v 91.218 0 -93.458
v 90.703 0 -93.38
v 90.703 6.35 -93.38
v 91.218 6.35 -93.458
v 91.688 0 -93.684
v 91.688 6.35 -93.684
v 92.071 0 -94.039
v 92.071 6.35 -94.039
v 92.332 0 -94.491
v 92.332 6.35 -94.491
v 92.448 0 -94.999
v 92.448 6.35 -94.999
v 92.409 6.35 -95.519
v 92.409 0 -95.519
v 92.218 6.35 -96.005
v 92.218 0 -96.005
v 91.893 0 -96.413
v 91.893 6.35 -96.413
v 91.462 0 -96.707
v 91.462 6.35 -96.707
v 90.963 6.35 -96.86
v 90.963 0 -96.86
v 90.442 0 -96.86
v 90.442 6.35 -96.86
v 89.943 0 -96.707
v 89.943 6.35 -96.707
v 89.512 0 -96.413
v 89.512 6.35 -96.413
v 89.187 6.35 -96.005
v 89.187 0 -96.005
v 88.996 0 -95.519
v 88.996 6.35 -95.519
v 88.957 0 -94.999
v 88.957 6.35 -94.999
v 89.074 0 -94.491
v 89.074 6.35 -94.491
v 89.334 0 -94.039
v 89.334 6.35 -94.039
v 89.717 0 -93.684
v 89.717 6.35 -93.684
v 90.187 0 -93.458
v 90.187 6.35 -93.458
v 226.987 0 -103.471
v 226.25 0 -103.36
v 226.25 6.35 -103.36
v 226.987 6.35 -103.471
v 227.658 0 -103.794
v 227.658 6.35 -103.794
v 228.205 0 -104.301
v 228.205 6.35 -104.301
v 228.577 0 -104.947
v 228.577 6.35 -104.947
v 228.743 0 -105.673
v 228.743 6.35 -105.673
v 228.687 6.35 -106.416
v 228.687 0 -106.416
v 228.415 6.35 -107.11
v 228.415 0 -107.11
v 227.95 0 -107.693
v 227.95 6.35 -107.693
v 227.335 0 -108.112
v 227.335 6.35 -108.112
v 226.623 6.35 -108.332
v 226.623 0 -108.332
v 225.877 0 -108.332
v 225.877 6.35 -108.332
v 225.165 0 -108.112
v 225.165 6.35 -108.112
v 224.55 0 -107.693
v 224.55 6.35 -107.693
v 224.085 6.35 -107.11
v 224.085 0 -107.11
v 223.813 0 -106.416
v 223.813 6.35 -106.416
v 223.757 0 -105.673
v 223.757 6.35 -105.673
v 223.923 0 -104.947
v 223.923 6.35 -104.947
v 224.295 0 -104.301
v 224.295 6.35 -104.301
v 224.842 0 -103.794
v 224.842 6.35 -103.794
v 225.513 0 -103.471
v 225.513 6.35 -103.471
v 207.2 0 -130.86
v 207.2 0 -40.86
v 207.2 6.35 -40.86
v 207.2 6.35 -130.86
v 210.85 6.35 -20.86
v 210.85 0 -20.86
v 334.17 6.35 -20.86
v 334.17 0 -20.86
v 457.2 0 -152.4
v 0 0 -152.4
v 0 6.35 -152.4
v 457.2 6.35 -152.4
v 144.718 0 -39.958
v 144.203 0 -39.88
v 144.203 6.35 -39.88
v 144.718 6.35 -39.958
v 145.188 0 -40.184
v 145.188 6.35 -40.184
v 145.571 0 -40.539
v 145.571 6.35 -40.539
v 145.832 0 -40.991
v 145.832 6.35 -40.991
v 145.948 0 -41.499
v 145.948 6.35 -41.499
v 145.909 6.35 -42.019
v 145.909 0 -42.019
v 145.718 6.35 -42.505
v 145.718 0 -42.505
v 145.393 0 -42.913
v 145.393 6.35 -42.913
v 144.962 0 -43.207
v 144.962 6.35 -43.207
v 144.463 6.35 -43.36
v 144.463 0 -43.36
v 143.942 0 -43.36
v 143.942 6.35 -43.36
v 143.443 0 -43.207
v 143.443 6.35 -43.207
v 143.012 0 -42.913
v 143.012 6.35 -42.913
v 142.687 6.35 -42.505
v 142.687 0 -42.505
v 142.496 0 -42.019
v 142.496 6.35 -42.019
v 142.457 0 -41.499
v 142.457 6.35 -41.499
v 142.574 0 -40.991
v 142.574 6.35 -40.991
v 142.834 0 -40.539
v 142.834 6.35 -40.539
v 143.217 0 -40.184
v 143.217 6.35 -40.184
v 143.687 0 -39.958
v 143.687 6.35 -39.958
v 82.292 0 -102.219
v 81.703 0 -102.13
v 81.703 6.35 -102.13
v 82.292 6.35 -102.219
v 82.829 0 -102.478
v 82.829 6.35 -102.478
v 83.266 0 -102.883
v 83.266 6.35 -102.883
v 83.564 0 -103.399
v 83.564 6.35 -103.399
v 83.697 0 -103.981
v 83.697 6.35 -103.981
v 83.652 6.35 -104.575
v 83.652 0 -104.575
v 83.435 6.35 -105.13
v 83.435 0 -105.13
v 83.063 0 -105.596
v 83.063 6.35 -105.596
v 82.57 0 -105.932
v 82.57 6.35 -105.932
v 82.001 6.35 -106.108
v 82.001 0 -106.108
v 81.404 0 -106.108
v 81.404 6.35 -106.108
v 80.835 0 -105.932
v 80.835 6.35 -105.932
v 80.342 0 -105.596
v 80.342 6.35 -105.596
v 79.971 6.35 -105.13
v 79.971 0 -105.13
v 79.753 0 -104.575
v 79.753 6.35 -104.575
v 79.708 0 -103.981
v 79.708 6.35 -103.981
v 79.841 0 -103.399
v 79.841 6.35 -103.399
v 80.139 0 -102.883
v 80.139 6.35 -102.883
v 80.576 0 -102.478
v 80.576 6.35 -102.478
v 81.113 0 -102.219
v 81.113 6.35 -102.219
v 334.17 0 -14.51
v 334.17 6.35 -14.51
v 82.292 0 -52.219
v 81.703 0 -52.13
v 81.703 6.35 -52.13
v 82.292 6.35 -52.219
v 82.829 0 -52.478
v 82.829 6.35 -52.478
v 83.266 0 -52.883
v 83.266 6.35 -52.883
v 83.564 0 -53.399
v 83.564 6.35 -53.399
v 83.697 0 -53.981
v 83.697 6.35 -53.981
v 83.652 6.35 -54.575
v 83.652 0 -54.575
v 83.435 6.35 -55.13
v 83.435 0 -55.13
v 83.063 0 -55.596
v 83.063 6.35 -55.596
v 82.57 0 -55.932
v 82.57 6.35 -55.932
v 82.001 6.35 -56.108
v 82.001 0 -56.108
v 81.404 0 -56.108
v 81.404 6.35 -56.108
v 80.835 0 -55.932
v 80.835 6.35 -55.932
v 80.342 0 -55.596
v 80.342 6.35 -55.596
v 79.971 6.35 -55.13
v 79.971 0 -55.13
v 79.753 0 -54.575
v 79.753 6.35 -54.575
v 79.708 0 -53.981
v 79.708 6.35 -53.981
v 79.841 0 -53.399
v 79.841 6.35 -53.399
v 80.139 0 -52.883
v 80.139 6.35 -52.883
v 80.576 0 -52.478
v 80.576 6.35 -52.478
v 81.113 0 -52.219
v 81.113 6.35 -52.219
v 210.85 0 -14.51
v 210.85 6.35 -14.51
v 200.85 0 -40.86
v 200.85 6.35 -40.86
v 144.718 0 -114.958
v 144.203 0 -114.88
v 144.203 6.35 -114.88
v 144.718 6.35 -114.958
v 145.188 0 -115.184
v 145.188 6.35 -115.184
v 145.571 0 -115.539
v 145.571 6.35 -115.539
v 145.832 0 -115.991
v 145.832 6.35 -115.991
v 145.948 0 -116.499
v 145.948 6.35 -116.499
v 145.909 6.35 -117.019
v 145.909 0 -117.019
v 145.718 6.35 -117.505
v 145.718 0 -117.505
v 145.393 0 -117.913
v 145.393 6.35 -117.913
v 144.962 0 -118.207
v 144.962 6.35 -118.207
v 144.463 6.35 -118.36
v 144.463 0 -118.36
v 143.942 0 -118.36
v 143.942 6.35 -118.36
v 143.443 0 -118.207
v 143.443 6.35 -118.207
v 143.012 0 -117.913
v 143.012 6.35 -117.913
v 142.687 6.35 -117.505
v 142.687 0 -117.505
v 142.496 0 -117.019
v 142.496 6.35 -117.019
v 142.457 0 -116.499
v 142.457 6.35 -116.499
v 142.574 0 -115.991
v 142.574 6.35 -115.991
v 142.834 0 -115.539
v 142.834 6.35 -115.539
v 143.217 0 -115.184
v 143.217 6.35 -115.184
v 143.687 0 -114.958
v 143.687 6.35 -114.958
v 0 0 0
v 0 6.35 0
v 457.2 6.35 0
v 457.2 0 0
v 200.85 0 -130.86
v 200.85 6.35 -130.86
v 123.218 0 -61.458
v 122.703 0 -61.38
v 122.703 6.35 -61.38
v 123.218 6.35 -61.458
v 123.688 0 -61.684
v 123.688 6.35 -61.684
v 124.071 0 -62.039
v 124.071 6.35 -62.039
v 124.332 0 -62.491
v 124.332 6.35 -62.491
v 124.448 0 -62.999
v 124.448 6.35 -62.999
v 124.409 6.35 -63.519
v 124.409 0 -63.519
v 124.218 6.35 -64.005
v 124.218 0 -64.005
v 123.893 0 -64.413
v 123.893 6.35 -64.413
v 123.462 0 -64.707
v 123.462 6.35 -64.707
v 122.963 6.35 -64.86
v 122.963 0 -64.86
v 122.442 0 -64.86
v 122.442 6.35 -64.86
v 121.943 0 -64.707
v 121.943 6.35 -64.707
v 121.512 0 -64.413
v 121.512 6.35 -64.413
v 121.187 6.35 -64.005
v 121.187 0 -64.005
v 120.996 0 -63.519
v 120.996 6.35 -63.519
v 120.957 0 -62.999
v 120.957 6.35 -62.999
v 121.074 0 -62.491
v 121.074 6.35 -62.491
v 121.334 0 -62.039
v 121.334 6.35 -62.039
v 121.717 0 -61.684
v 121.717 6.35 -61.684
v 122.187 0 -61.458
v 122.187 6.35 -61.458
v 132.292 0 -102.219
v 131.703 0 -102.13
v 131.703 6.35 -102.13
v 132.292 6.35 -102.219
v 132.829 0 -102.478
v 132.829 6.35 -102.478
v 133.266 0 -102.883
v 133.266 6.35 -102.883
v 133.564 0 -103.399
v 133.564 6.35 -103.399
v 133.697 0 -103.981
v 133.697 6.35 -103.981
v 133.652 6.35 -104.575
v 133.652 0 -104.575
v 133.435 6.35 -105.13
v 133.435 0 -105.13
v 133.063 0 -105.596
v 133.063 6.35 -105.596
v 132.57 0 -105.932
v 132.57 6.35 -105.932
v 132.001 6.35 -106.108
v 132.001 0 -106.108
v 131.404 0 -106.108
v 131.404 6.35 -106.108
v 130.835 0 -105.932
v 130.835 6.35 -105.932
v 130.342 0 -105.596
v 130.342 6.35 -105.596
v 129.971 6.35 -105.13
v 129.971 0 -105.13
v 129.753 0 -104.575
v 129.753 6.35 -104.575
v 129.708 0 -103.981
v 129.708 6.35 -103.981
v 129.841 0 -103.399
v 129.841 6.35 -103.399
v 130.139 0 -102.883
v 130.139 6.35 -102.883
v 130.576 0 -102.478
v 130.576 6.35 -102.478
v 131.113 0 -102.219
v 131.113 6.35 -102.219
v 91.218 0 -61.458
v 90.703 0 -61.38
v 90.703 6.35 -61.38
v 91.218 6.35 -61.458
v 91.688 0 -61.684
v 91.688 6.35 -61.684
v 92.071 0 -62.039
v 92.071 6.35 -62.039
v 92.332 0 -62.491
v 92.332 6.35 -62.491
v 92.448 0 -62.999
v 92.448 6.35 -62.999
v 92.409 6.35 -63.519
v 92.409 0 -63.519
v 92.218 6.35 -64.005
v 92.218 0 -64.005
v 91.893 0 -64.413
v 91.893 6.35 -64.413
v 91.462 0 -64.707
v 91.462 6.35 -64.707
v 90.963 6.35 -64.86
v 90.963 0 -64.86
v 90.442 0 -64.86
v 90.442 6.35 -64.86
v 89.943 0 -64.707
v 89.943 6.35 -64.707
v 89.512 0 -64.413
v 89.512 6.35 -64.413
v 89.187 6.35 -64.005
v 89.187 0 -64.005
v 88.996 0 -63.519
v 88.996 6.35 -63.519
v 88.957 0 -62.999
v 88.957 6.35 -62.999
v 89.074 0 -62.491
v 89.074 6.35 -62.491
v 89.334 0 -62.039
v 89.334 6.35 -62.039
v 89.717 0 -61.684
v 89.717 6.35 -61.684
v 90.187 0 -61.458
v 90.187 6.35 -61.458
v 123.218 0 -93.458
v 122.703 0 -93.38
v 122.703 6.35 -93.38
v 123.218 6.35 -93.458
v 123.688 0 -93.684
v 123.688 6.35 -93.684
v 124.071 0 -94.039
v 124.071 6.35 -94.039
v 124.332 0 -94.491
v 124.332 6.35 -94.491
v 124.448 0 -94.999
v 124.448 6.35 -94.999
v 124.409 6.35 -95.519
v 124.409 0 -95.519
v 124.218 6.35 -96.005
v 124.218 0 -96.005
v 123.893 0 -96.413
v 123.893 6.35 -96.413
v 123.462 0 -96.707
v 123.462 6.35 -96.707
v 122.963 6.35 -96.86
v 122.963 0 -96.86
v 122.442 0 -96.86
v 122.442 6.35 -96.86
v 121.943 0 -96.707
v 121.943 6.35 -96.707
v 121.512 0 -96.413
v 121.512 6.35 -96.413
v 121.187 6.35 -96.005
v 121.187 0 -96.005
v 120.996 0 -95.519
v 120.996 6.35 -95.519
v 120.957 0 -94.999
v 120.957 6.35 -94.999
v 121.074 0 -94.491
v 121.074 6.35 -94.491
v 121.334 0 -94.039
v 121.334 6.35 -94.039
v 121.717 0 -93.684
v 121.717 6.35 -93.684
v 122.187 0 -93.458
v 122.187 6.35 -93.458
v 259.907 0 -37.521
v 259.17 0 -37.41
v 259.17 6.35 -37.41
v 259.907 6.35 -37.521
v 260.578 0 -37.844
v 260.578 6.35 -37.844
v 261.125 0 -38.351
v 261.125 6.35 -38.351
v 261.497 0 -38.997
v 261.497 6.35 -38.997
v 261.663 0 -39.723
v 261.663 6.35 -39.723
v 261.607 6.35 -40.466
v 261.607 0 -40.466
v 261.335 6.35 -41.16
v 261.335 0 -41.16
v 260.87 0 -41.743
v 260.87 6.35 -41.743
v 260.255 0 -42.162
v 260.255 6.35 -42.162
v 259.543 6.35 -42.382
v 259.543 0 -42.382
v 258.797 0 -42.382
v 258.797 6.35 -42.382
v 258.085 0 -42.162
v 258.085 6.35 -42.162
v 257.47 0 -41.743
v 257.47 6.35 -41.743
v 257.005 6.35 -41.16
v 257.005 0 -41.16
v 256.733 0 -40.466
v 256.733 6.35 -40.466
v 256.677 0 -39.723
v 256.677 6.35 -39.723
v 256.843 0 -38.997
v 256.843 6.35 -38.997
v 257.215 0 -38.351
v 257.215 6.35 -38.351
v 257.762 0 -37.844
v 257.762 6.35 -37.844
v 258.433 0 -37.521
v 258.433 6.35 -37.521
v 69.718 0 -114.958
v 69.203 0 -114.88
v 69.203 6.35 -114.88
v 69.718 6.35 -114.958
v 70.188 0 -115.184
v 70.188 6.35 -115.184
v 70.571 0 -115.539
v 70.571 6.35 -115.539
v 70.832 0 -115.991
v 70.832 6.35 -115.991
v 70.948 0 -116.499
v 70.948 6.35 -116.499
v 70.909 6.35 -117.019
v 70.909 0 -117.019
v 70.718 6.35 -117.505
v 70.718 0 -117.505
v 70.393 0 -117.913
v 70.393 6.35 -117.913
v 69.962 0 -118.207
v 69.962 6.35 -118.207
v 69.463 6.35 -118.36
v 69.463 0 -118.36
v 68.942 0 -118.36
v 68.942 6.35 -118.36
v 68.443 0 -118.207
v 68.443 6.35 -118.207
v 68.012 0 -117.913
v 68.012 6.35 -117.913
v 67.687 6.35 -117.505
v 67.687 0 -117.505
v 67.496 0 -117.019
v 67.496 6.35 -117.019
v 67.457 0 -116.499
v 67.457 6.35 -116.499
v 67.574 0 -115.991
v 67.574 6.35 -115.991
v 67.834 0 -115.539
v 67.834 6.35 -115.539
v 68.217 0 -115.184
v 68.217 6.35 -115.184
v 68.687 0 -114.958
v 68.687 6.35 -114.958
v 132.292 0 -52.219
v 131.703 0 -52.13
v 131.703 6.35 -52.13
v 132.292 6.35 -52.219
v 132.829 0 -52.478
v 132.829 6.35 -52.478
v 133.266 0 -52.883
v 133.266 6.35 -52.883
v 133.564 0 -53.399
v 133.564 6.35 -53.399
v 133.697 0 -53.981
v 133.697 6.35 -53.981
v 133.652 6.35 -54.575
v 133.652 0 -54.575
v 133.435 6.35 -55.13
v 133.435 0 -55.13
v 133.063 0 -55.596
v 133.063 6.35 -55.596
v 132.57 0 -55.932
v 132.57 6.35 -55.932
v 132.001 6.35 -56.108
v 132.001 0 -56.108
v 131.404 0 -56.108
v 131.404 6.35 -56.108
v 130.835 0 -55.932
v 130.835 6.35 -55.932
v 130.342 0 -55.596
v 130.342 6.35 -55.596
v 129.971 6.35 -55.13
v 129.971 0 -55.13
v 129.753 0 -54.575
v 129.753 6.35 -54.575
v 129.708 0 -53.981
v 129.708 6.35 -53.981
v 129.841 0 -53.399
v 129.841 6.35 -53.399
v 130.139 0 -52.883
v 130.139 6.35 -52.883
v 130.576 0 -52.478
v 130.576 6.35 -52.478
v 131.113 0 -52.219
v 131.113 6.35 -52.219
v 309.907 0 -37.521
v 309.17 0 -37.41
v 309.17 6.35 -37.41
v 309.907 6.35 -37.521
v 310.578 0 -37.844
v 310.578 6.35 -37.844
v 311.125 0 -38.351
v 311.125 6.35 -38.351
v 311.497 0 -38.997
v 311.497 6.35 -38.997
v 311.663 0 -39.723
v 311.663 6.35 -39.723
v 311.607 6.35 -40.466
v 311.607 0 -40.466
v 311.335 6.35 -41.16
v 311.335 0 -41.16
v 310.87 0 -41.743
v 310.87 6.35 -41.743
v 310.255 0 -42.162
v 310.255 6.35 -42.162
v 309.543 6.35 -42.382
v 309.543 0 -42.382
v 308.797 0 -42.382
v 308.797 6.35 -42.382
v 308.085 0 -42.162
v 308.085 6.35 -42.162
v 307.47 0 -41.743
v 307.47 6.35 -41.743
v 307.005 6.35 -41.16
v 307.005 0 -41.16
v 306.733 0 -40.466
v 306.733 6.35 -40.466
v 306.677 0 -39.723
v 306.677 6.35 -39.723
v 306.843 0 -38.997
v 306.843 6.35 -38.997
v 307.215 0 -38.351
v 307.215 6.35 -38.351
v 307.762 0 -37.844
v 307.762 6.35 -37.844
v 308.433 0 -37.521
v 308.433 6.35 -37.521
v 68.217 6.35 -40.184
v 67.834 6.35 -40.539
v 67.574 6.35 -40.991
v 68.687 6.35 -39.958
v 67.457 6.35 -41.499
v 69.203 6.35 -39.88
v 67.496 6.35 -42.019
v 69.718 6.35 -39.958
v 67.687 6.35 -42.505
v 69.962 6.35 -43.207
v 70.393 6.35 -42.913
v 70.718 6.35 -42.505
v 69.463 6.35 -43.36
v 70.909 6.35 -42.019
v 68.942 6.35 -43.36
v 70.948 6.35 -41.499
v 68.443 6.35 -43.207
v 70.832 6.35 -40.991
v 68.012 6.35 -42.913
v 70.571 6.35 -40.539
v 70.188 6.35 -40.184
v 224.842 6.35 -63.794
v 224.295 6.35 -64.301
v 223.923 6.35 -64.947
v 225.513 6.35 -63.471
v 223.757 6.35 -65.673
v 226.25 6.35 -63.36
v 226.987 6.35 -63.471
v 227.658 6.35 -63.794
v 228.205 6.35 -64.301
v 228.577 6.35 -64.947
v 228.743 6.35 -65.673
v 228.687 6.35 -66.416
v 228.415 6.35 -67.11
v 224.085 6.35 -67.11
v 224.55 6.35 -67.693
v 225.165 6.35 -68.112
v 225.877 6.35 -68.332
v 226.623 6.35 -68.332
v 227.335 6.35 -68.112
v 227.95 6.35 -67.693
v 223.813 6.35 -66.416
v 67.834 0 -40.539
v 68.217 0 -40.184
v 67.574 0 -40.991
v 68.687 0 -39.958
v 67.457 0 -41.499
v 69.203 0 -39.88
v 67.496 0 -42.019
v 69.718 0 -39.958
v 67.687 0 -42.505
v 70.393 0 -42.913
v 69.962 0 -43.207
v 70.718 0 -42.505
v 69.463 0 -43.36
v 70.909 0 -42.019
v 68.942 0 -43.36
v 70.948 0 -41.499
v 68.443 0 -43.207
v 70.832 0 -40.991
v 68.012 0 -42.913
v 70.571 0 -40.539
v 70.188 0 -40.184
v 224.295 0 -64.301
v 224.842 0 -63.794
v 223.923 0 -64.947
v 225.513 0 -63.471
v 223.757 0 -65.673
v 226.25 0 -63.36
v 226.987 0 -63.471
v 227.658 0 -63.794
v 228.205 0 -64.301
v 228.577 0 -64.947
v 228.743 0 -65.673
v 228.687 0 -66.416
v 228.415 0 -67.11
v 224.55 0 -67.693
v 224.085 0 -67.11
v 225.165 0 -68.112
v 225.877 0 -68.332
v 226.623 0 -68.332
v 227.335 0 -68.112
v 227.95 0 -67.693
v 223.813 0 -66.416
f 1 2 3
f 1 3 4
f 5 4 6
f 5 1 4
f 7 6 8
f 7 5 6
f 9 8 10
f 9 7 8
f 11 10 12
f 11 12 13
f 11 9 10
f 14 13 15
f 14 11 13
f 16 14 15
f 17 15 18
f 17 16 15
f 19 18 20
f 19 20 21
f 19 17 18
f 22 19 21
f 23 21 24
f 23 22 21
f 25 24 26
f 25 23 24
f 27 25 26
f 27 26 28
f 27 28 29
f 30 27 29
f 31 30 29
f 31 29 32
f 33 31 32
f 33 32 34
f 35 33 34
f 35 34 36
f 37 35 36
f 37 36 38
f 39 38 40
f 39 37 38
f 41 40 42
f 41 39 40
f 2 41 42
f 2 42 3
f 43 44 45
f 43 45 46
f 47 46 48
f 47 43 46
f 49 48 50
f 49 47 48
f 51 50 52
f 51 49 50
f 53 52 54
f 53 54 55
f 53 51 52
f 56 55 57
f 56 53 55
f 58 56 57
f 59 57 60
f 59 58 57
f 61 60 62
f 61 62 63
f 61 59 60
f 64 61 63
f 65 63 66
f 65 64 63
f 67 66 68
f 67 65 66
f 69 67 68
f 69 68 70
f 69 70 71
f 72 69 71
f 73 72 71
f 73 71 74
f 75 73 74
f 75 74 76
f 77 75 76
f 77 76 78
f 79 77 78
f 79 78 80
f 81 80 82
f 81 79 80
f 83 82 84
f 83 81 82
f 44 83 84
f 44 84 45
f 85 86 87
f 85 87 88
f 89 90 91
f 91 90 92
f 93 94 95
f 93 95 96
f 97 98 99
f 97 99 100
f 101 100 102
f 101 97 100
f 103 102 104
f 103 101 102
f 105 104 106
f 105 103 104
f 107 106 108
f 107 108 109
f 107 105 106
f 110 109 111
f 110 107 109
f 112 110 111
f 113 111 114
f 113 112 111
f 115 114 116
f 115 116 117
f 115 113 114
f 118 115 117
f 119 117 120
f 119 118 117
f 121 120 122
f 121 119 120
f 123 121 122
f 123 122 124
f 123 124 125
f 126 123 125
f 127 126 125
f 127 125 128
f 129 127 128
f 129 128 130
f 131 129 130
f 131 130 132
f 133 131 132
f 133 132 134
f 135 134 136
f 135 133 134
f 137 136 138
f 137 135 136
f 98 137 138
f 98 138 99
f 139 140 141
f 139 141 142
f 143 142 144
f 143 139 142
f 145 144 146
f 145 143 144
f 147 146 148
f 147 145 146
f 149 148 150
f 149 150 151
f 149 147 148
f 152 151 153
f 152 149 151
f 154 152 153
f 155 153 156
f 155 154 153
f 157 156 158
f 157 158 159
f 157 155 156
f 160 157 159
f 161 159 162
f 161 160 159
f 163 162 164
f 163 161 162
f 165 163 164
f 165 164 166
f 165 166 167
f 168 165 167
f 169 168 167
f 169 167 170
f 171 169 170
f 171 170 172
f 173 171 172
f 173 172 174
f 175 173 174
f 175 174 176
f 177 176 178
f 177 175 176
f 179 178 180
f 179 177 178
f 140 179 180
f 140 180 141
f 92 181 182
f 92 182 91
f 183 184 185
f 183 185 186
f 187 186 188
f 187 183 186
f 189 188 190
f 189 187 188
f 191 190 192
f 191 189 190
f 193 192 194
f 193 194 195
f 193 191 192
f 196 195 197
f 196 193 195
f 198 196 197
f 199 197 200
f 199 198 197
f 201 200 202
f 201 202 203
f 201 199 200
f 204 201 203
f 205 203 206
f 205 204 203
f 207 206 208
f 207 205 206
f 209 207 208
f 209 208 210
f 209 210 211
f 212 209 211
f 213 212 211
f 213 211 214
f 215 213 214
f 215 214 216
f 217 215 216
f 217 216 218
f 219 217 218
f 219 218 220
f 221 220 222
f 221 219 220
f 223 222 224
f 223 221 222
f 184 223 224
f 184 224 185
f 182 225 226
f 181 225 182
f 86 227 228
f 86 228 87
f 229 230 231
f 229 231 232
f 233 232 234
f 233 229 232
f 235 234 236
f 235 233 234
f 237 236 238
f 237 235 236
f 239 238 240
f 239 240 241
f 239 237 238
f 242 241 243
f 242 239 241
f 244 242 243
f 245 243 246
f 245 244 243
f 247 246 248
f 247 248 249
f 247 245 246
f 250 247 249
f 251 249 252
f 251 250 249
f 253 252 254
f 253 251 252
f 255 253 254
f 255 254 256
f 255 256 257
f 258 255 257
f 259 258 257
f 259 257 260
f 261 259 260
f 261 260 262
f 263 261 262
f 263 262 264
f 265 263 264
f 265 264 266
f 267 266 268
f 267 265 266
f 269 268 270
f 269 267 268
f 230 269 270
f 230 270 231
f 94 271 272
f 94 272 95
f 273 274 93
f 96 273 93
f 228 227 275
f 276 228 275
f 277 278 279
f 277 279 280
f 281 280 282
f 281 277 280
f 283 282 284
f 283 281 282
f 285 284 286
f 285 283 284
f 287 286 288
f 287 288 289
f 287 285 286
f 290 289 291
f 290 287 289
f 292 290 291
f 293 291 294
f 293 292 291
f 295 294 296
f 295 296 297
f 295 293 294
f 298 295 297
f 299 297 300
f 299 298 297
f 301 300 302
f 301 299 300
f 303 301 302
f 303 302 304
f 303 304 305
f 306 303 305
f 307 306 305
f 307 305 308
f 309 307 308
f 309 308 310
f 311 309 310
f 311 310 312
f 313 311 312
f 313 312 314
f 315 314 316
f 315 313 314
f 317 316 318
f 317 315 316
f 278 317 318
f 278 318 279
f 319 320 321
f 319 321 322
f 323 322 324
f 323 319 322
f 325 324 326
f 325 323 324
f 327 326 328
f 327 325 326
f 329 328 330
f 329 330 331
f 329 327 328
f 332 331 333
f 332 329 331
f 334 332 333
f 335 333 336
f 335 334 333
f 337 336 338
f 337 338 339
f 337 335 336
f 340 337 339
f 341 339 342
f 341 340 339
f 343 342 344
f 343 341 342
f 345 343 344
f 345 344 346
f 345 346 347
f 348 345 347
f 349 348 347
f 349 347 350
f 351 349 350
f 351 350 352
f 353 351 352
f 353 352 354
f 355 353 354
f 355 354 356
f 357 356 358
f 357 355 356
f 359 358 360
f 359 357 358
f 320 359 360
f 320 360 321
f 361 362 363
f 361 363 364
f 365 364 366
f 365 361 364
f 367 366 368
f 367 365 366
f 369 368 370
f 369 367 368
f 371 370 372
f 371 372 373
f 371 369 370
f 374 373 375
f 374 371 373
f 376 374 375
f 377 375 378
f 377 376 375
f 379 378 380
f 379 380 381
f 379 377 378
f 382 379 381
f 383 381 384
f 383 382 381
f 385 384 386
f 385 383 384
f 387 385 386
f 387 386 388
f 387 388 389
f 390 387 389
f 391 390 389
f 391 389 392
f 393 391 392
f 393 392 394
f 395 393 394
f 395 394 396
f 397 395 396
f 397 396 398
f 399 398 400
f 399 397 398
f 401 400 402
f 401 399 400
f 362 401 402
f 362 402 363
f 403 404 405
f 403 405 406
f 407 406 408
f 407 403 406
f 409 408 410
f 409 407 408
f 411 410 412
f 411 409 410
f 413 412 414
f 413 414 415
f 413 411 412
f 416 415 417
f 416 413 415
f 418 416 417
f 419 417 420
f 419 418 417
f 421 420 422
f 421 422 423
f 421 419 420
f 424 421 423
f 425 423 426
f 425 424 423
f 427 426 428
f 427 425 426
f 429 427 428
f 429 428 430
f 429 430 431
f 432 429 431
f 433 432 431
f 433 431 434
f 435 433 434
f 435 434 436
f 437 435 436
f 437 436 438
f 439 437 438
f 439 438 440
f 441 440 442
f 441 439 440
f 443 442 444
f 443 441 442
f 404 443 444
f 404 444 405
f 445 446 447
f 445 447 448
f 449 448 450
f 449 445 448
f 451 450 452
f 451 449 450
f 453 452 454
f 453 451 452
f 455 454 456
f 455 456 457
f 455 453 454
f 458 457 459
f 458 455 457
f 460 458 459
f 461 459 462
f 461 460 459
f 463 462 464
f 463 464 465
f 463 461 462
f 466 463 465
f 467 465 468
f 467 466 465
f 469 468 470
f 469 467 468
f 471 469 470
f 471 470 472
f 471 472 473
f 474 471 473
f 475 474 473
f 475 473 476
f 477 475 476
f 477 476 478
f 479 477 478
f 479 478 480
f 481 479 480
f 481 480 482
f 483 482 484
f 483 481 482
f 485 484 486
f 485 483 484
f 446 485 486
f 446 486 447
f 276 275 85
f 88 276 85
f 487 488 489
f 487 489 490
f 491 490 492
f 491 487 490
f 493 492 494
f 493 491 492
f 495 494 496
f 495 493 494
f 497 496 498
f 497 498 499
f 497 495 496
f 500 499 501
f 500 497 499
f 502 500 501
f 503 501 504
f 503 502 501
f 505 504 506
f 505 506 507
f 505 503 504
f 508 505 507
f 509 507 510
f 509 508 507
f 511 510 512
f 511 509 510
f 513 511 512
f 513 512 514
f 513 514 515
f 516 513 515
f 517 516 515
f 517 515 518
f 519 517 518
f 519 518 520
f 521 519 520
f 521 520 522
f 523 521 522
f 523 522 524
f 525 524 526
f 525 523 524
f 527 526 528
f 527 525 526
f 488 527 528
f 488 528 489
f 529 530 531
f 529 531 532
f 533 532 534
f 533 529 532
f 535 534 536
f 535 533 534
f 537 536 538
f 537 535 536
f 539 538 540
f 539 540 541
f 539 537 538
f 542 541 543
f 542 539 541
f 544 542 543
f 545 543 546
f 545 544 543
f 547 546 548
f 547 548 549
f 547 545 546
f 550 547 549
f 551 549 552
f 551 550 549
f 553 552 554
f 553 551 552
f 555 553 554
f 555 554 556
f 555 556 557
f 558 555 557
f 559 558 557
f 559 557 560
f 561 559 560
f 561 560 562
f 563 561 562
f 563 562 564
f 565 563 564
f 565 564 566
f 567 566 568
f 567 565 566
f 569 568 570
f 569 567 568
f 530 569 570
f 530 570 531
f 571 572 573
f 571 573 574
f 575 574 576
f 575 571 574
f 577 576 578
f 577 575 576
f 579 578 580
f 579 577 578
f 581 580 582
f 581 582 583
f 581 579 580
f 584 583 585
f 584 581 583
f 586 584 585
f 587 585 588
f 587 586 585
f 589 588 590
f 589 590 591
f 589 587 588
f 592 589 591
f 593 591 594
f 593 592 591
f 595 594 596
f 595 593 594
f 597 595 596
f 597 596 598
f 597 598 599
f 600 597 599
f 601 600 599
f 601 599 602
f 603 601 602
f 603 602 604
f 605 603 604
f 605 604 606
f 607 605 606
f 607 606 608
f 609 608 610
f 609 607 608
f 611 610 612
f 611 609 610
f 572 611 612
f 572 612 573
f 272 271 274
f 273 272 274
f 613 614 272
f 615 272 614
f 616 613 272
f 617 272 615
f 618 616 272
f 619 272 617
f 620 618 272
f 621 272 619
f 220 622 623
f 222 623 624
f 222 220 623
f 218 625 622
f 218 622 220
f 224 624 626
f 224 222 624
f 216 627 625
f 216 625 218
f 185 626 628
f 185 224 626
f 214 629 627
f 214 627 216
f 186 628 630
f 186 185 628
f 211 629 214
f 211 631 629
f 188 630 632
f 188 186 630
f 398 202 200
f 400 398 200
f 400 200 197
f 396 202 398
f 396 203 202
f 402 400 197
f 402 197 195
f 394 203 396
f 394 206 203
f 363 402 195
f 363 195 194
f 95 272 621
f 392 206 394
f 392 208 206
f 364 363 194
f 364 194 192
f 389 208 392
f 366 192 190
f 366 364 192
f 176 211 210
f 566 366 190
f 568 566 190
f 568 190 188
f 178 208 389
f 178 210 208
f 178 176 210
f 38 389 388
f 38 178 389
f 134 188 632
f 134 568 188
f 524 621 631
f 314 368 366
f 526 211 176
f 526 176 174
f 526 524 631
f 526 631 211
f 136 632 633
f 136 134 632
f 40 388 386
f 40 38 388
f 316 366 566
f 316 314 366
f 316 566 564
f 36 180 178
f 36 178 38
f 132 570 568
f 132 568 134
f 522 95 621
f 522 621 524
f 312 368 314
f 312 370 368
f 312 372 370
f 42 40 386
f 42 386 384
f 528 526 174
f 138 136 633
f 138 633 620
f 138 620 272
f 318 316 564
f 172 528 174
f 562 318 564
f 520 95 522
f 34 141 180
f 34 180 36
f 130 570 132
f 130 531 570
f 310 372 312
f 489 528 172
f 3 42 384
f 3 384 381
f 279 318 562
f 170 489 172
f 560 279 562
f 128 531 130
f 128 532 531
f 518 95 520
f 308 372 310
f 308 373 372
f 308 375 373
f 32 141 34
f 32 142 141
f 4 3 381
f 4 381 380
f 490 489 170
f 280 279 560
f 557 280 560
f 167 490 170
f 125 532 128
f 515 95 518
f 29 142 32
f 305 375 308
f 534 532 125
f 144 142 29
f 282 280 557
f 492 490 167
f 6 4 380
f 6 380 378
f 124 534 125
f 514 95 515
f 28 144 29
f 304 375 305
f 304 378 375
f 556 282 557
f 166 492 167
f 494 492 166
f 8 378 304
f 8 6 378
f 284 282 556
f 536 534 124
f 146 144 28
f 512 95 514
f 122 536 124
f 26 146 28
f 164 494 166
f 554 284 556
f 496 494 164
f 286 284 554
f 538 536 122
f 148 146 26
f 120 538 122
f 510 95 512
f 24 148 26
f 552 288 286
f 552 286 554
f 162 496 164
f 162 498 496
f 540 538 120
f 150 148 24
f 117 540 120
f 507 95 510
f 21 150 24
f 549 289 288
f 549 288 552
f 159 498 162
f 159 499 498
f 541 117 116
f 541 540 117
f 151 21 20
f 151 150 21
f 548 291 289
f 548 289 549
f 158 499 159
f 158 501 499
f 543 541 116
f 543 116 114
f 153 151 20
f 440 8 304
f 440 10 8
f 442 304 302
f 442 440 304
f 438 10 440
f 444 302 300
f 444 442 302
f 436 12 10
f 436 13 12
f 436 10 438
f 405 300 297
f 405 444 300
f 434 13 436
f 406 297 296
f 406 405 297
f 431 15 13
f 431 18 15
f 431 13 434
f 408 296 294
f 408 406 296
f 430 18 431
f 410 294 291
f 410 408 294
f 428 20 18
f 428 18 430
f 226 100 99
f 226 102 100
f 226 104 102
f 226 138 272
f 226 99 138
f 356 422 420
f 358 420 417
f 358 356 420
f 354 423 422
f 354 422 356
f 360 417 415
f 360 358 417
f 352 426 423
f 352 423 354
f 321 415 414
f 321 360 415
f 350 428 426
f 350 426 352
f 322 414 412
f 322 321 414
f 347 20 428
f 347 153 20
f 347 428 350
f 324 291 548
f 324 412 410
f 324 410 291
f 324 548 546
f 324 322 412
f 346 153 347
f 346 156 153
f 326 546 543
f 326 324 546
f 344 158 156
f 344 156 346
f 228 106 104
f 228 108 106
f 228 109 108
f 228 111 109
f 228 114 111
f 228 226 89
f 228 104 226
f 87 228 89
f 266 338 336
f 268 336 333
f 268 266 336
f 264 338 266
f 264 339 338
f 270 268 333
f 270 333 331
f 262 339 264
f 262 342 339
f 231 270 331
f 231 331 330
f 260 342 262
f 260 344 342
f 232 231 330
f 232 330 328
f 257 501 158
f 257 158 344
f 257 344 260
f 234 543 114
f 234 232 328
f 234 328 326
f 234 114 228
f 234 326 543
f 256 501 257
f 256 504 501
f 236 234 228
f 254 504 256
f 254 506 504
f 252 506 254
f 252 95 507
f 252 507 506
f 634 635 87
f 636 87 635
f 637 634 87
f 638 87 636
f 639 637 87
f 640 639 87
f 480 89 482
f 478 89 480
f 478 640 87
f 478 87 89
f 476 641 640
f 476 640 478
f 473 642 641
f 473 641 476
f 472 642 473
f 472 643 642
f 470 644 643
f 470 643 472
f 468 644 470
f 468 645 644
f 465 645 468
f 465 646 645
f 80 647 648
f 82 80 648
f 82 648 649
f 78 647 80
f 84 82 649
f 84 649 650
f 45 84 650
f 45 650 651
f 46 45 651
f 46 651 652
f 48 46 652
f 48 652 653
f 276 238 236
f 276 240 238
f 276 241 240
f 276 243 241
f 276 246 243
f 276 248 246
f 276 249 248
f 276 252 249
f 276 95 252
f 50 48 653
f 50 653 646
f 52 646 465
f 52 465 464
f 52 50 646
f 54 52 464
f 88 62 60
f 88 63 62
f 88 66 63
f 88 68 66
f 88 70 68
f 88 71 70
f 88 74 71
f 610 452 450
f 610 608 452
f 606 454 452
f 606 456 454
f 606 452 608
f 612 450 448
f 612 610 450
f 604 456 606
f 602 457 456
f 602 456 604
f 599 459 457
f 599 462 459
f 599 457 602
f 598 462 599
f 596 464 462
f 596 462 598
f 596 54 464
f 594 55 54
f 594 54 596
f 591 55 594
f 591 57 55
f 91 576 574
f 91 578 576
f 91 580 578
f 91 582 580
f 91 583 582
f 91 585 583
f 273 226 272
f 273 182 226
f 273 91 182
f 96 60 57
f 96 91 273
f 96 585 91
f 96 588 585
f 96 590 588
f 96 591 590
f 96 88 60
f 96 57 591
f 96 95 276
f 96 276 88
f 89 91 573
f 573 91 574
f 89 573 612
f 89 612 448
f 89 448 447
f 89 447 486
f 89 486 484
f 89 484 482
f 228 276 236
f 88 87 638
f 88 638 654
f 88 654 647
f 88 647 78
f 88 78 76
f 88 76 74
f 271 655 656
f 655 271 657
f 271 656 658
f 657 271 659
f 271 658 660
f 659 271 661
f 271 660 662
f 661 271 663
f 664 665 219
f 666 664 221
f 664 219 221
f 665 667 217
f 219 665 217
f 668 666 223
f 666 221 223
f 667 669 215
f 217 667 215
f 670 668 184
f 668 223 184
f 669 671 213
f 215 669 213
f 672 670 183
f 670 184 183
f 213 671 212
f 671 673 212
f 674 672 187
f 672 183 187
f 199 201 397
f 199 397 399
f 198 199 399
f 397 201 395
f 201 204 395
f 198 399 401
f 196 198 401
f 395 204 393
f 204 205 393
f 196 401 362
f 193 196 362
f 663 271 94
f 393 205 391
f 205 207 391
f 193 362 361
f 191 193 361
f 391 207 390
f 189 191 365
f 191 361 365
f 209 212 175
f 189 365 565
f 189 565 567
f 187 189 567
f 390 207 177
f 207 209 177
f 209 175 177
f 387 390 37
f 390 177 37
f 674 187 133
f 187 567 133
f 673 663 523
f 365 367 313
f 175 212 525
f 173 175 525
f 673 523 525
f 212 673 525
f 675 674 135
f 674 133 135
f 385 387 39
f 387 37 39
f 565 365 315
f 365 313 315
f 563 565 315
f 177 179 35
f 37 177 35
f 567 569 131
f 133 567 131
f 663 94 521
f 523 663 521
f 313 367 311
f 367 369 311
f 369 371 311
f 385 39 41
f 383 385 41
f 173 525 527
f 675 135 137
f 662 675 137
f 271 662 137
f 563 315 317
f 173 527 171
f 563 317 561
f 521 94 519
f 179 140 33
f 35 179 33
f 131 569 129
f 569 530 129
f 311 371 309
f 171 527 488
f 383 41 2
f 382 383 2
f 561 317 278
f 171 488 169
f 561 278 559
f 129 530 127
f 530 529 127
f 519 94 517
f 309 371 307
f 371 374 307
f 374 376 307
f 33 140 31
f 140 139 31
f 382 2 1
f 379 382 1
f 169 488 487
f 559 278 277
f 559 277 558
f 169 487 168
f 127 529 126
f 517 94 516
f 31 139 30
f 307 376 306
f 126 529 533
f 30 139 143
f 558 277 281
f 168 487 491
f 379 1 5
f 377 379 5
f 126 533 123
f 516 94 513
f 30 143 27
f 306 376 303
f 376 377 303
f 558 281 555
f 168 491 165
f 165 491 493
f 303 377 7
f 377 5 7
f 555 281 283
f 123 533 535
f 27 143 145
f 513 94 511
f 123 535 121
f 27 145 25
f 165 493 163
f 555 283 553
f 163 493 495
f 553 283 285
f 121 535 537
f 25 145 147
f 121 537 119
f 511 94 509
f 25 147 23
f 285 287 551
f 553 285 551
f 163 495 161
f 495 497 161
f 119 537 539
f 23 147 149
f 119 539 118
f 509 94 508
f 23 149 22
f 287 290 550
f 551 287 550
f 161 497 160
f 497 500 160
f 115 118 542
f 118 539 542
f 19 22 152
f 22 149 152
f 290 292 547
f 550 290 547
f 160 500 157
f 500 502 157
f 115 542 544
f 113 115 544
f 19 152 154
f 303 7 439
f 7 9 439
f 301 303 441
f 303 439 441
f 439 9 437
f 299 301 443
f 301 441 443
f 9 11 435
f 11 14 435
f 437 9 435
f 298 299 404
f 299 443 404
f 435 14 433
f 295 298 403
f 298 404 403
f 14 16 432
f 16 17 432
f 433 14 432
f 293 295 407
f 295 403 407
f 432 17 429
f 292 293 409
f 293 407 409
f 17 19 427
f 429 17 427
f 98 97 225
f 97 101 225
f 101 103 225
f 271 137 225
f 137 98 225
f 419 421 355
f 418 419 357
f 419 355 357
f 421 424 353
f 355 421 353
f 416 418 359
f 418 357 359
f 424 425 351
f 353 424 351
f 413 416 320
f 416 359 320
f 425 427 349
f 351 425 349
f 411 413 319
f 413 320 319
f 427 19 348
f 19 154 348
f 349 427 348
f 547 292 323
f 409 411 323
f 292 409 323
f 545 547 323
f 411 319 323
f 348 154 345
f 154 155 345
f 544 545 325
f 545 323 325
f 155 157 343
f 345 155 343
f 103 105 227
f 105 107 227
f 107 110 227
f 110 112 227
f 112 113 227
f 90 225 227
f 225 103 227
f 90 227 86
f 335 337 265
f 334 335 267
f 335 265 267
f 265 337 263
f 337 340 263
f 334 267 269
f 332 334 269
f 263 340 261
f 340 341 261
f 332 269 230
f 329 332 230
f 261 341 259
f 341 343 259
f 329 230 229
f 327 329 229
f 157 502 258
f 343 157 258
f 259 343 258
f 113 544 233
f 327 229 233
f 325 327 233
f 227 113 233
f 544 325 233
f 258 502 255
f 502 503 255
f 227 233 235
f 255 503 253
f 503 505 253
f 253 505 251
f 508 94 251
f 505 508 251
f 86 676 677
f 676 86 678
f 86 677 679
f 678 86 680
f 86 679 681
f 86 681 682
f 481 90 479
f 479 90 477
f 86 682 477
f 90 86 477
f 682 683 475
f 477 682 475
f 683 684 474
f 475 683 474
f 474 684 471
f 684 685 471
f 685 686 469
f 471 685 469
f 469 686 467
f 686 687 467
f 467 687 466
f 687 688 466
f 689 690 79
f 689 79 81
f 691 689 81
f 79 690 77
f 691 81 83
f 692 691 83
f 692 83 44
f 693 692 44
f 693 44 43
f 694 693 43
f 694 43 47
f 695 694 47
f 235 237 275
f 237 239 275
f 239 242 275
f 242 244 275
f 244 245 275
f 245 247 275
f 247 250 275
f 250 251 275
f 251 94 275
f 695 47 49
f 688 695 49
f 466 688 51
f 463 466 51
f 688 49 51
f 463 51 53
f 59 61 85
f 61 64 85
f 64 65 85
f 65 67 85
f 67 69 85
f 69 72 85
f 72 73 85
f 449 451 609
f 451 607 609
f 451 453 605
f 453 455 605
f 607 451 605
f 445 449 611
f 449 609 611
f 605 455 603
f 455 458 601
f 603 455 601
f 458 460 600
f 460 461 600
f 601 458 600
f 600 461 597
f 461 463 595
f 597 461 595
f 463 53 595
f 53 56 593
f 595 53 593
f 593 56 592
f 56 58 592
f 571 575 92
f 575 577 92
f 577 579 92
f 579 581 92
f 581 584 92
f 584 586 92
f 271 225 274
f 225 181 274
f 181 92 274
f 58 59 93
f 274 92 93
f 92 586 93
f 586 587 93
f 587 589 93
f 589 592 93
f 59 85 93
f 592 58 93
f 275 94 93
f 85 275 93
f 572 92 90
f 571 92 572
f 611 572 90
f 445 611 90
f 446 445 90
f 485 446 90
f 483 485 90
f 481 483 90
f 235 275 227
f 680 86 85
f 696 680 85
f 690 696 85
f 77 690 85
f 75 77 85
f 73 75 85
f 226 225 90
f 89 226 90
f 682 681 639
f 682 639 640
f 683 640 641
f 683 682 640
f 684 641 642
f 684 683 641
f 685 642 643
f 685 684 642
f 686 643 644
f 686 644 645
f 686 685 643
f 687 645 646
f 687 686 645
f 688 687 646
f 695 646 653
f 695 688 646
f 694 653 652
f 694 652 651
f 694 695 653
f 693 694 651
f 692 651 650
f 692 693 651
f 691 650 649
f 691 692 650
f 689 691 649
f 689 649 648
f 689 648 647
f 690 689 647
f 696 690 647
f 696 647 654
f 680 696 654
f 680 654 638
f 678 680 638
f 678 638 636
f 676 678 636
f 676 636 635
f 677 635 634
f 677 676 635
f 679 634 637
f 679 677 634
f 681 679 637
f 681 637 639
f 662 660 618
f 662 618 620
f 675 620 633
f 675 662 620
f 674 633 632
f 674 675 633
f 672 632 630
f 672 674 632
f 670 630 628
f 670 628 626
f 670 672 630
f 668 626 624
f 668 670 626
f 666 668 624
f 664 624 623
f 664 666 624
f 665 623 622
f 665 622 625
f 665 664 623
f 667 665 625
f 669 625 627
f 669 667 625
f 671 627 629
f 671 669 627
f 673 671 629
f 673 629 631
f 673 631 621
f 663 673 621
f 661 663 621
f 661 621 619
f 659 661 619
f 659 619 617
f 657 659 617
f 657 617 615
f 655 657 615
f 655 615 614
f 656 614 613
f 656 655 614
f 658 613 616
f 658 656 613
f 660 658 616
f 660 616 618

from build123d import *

# Parameters (mm, degrees)
SKETCH1_W           = 457.2
SKETCH1_H           = 152.4
SKETCH1_R           = 1.75
SKETCH1_R_2         = 2.5
SKETCH1_R_3         = 2
SKETCH1_W_2         = 123.32
SKETCH1_H_2         = 6.35
SKETCH1_W_3         = 6.35
SKETCH1_H_3         = 90
BOSS_EXTRUDE1_DEPTH = 6.35


with BuildPart() as part:
    # Sketch1 → Boss-Extrude1 (new body)
    with BuildSketch(Plane(origin=(0, 0, 0), x_dir=(1, 0, 0), z_dir=(0, 1, 0))):
        with Locations((228.6, 76.2)):
            Rectangle(SKETCH1_W, SKETCH1_H)
        with Locations(Location((90.702581284, 95.13, 0), (0, 0, 270))):
            Circle(SKETCH1_R, mode=Mode.SUBTRACT)
        with Locations(Location((122.702581284, 95.13, 0), (0, 0, 270))):
            Circle(SKETCH1_R, mode=Mode.SUBTRACT)
        with Locations(Location((122.702581284, 63.13, 0), (0, 0, 270))):
            Circle(SKETCH1_R, mode=Mode.SUBTRACT)
        with Locations(Location((90.702581284, 63.13, 0), (0, 0, 270))):
            Circle(SKETCH1_R, mode=Mode.SUBTRACT)
        with Locations(Location((69.202581284, 116.63, 0), (0, 0, 270))):
            Circle(SKETCH1_R, mode=Mode.SUBTRACT)
        with Locations(Location((144.202581284, 116.63, 0), (0, 0, 270))):
            Circle(SKETCH1_R, mode=Mode.SUBTRACT)
        with Locations(Location((144.202581284, 41.63, 0), (0, 0, 270))):
            Circle(SKETCH1_R, mode=Mode.SUBTRACT)
        with Locations(Location((69.202581284, 41.63, 0), (0, 0, 270))):
            Circle(SKETCH1_R, mode=Mode.SUBTRACT)
        with Locations(Location((226.25, 65.86, 0), (0, 0, 270))):
            Circle(SKETCH1_R_2, mode=Mode.SUBTRACT)
        with Locations(Location((226.25, 105.86, 0), (0, 0, 270))):
            Circle(SKETCH1_R_2, mode=Mode.SUBTRACT)
        with Locations(Location((259.17, 39.91, 0), (0, 0, 270))):
            Circle(SKETCH1_R_2, mode=Mode.SUBTRACT)
        with Locations(Location((309.17, 39.91, 0), (0, 0, 270))):
            Circle(SKETCH1_R_2, mode=Mode.SUBTRACT)
        with Locations(Location((81.702581284, 104.13, 0), (0, 0, 270))):
            Circle(SKETCH1_R_3, mode=Mode.SUBTRACT)
        with Locations(Location((131.702581284, 104.13, 0), (0, 0, 270))):
            Circle(SKETCH1_R_3, mode=Mode.SUBTRACT)
        with Locations(Location((131.702581284, 54.13, 0), (0, 0, 270))):
            Circle(SKETCH1_R_3, mode=Mode.SUBTRACT)
        with Locations(Location((81.702581284, 54.13, 0), (0, 0, 270))):
            Circle(SKETCH1_R_3, mode=Mode.SUBTRACT)
        with Locations((272.51, 17.685)):
            Rectangle(SKETCH1_W_2, SKETCH1_H_2, mode=Mode.SUBTRACT)
        with Locations((204.025, 85.86)):
            Rectangle(SKETCH1_W_3, SKETCH1_H_3, mode=Mode.SUBTRACT)
    extrude(amount=BOSS_EXTRUDE1_DEPTH)


solid = part.part
